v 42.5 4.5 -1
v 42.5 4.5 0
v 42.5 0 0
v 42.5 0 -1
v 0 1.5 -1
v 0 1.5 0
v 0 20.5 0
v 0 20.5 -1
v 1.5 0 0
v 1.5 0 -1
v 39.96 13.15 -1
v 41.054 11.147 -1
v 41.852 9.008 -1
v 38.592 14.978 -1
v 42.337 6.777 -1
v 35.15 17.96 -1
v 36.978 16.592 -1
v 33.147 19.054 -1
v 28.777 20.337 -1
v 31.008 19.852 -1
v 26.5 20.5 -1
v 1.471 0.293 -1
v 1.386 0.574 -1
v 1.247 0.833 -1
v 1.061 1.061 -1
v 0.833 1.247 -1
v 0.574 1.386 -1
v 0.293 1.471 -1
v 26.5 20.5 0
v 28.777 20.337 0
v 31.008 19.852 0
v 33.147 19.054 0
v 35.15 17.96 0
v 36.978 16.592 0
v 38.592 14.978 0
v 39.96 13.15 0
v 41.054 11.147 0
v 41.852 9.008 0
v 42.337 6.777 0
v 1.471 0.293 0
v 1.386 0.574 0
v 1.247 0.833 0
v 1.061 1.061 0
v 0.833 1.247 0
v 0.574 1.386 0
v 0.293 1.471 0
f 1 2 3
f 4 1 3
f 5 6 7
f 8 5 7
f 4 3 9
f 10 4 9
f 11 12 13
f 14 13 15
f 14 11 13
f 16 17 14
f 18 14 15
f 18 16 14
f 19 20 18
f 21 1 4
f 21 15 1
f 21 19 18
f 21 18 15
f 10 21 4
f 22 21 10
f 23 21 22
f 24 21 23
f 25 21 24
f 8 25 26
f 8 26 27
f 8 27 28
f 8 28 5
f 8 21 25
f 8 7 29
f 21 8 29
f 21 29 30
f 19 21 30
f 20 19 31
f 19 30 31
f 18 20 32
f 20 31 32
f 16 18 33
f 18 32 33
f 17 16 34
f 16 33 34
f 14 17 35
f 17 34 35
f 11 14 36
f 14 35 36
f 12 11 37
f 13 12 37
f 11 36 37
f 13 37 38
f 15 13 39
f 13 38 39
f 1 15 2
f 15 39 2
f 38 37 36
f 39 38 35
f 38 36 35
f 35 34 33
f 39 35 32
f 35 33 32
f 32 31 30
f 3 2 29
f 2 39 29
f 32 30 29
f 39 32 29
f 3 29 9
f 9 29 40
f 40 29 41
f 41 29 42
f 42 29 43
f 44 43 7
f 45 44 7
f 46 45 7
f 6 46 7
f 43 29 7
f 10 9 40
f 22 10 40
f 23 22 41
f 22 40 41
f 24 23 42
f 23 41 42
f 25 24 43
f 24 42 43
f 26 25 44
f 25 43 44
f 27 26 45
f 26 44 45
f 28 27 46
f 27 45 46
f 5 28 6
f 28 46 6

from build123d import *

# Parameters (mm, degrees)
BASE_FLANGE1_DEPTH = 1


# Sheet-metal steps are written as plain solids
with BuildPart() as part:
    # Sketch1 → Base-Flange1 (new body)
    with BuildSketch(Plane.XY):
        with BuildLine():
            Line((42.5, 4.5), (42.5, 0))
            Line((42.5, 0), (1.5, 0))
            ThreePointArc((1.5, 0), (1.060660172, 1.060660172), (0, 1.5))
            Line((0, 1.5), (0, 20.5))
            Line((0, 20.5), (26.5, 20.5))
            ThreePointArc((26.5, 20.5), (37.813708499, 15.813708499), (42.5, 4.5))
        make_face()
    extrude(amount=-BASE_FLANGE1_DEPTH)


solid = part.part
